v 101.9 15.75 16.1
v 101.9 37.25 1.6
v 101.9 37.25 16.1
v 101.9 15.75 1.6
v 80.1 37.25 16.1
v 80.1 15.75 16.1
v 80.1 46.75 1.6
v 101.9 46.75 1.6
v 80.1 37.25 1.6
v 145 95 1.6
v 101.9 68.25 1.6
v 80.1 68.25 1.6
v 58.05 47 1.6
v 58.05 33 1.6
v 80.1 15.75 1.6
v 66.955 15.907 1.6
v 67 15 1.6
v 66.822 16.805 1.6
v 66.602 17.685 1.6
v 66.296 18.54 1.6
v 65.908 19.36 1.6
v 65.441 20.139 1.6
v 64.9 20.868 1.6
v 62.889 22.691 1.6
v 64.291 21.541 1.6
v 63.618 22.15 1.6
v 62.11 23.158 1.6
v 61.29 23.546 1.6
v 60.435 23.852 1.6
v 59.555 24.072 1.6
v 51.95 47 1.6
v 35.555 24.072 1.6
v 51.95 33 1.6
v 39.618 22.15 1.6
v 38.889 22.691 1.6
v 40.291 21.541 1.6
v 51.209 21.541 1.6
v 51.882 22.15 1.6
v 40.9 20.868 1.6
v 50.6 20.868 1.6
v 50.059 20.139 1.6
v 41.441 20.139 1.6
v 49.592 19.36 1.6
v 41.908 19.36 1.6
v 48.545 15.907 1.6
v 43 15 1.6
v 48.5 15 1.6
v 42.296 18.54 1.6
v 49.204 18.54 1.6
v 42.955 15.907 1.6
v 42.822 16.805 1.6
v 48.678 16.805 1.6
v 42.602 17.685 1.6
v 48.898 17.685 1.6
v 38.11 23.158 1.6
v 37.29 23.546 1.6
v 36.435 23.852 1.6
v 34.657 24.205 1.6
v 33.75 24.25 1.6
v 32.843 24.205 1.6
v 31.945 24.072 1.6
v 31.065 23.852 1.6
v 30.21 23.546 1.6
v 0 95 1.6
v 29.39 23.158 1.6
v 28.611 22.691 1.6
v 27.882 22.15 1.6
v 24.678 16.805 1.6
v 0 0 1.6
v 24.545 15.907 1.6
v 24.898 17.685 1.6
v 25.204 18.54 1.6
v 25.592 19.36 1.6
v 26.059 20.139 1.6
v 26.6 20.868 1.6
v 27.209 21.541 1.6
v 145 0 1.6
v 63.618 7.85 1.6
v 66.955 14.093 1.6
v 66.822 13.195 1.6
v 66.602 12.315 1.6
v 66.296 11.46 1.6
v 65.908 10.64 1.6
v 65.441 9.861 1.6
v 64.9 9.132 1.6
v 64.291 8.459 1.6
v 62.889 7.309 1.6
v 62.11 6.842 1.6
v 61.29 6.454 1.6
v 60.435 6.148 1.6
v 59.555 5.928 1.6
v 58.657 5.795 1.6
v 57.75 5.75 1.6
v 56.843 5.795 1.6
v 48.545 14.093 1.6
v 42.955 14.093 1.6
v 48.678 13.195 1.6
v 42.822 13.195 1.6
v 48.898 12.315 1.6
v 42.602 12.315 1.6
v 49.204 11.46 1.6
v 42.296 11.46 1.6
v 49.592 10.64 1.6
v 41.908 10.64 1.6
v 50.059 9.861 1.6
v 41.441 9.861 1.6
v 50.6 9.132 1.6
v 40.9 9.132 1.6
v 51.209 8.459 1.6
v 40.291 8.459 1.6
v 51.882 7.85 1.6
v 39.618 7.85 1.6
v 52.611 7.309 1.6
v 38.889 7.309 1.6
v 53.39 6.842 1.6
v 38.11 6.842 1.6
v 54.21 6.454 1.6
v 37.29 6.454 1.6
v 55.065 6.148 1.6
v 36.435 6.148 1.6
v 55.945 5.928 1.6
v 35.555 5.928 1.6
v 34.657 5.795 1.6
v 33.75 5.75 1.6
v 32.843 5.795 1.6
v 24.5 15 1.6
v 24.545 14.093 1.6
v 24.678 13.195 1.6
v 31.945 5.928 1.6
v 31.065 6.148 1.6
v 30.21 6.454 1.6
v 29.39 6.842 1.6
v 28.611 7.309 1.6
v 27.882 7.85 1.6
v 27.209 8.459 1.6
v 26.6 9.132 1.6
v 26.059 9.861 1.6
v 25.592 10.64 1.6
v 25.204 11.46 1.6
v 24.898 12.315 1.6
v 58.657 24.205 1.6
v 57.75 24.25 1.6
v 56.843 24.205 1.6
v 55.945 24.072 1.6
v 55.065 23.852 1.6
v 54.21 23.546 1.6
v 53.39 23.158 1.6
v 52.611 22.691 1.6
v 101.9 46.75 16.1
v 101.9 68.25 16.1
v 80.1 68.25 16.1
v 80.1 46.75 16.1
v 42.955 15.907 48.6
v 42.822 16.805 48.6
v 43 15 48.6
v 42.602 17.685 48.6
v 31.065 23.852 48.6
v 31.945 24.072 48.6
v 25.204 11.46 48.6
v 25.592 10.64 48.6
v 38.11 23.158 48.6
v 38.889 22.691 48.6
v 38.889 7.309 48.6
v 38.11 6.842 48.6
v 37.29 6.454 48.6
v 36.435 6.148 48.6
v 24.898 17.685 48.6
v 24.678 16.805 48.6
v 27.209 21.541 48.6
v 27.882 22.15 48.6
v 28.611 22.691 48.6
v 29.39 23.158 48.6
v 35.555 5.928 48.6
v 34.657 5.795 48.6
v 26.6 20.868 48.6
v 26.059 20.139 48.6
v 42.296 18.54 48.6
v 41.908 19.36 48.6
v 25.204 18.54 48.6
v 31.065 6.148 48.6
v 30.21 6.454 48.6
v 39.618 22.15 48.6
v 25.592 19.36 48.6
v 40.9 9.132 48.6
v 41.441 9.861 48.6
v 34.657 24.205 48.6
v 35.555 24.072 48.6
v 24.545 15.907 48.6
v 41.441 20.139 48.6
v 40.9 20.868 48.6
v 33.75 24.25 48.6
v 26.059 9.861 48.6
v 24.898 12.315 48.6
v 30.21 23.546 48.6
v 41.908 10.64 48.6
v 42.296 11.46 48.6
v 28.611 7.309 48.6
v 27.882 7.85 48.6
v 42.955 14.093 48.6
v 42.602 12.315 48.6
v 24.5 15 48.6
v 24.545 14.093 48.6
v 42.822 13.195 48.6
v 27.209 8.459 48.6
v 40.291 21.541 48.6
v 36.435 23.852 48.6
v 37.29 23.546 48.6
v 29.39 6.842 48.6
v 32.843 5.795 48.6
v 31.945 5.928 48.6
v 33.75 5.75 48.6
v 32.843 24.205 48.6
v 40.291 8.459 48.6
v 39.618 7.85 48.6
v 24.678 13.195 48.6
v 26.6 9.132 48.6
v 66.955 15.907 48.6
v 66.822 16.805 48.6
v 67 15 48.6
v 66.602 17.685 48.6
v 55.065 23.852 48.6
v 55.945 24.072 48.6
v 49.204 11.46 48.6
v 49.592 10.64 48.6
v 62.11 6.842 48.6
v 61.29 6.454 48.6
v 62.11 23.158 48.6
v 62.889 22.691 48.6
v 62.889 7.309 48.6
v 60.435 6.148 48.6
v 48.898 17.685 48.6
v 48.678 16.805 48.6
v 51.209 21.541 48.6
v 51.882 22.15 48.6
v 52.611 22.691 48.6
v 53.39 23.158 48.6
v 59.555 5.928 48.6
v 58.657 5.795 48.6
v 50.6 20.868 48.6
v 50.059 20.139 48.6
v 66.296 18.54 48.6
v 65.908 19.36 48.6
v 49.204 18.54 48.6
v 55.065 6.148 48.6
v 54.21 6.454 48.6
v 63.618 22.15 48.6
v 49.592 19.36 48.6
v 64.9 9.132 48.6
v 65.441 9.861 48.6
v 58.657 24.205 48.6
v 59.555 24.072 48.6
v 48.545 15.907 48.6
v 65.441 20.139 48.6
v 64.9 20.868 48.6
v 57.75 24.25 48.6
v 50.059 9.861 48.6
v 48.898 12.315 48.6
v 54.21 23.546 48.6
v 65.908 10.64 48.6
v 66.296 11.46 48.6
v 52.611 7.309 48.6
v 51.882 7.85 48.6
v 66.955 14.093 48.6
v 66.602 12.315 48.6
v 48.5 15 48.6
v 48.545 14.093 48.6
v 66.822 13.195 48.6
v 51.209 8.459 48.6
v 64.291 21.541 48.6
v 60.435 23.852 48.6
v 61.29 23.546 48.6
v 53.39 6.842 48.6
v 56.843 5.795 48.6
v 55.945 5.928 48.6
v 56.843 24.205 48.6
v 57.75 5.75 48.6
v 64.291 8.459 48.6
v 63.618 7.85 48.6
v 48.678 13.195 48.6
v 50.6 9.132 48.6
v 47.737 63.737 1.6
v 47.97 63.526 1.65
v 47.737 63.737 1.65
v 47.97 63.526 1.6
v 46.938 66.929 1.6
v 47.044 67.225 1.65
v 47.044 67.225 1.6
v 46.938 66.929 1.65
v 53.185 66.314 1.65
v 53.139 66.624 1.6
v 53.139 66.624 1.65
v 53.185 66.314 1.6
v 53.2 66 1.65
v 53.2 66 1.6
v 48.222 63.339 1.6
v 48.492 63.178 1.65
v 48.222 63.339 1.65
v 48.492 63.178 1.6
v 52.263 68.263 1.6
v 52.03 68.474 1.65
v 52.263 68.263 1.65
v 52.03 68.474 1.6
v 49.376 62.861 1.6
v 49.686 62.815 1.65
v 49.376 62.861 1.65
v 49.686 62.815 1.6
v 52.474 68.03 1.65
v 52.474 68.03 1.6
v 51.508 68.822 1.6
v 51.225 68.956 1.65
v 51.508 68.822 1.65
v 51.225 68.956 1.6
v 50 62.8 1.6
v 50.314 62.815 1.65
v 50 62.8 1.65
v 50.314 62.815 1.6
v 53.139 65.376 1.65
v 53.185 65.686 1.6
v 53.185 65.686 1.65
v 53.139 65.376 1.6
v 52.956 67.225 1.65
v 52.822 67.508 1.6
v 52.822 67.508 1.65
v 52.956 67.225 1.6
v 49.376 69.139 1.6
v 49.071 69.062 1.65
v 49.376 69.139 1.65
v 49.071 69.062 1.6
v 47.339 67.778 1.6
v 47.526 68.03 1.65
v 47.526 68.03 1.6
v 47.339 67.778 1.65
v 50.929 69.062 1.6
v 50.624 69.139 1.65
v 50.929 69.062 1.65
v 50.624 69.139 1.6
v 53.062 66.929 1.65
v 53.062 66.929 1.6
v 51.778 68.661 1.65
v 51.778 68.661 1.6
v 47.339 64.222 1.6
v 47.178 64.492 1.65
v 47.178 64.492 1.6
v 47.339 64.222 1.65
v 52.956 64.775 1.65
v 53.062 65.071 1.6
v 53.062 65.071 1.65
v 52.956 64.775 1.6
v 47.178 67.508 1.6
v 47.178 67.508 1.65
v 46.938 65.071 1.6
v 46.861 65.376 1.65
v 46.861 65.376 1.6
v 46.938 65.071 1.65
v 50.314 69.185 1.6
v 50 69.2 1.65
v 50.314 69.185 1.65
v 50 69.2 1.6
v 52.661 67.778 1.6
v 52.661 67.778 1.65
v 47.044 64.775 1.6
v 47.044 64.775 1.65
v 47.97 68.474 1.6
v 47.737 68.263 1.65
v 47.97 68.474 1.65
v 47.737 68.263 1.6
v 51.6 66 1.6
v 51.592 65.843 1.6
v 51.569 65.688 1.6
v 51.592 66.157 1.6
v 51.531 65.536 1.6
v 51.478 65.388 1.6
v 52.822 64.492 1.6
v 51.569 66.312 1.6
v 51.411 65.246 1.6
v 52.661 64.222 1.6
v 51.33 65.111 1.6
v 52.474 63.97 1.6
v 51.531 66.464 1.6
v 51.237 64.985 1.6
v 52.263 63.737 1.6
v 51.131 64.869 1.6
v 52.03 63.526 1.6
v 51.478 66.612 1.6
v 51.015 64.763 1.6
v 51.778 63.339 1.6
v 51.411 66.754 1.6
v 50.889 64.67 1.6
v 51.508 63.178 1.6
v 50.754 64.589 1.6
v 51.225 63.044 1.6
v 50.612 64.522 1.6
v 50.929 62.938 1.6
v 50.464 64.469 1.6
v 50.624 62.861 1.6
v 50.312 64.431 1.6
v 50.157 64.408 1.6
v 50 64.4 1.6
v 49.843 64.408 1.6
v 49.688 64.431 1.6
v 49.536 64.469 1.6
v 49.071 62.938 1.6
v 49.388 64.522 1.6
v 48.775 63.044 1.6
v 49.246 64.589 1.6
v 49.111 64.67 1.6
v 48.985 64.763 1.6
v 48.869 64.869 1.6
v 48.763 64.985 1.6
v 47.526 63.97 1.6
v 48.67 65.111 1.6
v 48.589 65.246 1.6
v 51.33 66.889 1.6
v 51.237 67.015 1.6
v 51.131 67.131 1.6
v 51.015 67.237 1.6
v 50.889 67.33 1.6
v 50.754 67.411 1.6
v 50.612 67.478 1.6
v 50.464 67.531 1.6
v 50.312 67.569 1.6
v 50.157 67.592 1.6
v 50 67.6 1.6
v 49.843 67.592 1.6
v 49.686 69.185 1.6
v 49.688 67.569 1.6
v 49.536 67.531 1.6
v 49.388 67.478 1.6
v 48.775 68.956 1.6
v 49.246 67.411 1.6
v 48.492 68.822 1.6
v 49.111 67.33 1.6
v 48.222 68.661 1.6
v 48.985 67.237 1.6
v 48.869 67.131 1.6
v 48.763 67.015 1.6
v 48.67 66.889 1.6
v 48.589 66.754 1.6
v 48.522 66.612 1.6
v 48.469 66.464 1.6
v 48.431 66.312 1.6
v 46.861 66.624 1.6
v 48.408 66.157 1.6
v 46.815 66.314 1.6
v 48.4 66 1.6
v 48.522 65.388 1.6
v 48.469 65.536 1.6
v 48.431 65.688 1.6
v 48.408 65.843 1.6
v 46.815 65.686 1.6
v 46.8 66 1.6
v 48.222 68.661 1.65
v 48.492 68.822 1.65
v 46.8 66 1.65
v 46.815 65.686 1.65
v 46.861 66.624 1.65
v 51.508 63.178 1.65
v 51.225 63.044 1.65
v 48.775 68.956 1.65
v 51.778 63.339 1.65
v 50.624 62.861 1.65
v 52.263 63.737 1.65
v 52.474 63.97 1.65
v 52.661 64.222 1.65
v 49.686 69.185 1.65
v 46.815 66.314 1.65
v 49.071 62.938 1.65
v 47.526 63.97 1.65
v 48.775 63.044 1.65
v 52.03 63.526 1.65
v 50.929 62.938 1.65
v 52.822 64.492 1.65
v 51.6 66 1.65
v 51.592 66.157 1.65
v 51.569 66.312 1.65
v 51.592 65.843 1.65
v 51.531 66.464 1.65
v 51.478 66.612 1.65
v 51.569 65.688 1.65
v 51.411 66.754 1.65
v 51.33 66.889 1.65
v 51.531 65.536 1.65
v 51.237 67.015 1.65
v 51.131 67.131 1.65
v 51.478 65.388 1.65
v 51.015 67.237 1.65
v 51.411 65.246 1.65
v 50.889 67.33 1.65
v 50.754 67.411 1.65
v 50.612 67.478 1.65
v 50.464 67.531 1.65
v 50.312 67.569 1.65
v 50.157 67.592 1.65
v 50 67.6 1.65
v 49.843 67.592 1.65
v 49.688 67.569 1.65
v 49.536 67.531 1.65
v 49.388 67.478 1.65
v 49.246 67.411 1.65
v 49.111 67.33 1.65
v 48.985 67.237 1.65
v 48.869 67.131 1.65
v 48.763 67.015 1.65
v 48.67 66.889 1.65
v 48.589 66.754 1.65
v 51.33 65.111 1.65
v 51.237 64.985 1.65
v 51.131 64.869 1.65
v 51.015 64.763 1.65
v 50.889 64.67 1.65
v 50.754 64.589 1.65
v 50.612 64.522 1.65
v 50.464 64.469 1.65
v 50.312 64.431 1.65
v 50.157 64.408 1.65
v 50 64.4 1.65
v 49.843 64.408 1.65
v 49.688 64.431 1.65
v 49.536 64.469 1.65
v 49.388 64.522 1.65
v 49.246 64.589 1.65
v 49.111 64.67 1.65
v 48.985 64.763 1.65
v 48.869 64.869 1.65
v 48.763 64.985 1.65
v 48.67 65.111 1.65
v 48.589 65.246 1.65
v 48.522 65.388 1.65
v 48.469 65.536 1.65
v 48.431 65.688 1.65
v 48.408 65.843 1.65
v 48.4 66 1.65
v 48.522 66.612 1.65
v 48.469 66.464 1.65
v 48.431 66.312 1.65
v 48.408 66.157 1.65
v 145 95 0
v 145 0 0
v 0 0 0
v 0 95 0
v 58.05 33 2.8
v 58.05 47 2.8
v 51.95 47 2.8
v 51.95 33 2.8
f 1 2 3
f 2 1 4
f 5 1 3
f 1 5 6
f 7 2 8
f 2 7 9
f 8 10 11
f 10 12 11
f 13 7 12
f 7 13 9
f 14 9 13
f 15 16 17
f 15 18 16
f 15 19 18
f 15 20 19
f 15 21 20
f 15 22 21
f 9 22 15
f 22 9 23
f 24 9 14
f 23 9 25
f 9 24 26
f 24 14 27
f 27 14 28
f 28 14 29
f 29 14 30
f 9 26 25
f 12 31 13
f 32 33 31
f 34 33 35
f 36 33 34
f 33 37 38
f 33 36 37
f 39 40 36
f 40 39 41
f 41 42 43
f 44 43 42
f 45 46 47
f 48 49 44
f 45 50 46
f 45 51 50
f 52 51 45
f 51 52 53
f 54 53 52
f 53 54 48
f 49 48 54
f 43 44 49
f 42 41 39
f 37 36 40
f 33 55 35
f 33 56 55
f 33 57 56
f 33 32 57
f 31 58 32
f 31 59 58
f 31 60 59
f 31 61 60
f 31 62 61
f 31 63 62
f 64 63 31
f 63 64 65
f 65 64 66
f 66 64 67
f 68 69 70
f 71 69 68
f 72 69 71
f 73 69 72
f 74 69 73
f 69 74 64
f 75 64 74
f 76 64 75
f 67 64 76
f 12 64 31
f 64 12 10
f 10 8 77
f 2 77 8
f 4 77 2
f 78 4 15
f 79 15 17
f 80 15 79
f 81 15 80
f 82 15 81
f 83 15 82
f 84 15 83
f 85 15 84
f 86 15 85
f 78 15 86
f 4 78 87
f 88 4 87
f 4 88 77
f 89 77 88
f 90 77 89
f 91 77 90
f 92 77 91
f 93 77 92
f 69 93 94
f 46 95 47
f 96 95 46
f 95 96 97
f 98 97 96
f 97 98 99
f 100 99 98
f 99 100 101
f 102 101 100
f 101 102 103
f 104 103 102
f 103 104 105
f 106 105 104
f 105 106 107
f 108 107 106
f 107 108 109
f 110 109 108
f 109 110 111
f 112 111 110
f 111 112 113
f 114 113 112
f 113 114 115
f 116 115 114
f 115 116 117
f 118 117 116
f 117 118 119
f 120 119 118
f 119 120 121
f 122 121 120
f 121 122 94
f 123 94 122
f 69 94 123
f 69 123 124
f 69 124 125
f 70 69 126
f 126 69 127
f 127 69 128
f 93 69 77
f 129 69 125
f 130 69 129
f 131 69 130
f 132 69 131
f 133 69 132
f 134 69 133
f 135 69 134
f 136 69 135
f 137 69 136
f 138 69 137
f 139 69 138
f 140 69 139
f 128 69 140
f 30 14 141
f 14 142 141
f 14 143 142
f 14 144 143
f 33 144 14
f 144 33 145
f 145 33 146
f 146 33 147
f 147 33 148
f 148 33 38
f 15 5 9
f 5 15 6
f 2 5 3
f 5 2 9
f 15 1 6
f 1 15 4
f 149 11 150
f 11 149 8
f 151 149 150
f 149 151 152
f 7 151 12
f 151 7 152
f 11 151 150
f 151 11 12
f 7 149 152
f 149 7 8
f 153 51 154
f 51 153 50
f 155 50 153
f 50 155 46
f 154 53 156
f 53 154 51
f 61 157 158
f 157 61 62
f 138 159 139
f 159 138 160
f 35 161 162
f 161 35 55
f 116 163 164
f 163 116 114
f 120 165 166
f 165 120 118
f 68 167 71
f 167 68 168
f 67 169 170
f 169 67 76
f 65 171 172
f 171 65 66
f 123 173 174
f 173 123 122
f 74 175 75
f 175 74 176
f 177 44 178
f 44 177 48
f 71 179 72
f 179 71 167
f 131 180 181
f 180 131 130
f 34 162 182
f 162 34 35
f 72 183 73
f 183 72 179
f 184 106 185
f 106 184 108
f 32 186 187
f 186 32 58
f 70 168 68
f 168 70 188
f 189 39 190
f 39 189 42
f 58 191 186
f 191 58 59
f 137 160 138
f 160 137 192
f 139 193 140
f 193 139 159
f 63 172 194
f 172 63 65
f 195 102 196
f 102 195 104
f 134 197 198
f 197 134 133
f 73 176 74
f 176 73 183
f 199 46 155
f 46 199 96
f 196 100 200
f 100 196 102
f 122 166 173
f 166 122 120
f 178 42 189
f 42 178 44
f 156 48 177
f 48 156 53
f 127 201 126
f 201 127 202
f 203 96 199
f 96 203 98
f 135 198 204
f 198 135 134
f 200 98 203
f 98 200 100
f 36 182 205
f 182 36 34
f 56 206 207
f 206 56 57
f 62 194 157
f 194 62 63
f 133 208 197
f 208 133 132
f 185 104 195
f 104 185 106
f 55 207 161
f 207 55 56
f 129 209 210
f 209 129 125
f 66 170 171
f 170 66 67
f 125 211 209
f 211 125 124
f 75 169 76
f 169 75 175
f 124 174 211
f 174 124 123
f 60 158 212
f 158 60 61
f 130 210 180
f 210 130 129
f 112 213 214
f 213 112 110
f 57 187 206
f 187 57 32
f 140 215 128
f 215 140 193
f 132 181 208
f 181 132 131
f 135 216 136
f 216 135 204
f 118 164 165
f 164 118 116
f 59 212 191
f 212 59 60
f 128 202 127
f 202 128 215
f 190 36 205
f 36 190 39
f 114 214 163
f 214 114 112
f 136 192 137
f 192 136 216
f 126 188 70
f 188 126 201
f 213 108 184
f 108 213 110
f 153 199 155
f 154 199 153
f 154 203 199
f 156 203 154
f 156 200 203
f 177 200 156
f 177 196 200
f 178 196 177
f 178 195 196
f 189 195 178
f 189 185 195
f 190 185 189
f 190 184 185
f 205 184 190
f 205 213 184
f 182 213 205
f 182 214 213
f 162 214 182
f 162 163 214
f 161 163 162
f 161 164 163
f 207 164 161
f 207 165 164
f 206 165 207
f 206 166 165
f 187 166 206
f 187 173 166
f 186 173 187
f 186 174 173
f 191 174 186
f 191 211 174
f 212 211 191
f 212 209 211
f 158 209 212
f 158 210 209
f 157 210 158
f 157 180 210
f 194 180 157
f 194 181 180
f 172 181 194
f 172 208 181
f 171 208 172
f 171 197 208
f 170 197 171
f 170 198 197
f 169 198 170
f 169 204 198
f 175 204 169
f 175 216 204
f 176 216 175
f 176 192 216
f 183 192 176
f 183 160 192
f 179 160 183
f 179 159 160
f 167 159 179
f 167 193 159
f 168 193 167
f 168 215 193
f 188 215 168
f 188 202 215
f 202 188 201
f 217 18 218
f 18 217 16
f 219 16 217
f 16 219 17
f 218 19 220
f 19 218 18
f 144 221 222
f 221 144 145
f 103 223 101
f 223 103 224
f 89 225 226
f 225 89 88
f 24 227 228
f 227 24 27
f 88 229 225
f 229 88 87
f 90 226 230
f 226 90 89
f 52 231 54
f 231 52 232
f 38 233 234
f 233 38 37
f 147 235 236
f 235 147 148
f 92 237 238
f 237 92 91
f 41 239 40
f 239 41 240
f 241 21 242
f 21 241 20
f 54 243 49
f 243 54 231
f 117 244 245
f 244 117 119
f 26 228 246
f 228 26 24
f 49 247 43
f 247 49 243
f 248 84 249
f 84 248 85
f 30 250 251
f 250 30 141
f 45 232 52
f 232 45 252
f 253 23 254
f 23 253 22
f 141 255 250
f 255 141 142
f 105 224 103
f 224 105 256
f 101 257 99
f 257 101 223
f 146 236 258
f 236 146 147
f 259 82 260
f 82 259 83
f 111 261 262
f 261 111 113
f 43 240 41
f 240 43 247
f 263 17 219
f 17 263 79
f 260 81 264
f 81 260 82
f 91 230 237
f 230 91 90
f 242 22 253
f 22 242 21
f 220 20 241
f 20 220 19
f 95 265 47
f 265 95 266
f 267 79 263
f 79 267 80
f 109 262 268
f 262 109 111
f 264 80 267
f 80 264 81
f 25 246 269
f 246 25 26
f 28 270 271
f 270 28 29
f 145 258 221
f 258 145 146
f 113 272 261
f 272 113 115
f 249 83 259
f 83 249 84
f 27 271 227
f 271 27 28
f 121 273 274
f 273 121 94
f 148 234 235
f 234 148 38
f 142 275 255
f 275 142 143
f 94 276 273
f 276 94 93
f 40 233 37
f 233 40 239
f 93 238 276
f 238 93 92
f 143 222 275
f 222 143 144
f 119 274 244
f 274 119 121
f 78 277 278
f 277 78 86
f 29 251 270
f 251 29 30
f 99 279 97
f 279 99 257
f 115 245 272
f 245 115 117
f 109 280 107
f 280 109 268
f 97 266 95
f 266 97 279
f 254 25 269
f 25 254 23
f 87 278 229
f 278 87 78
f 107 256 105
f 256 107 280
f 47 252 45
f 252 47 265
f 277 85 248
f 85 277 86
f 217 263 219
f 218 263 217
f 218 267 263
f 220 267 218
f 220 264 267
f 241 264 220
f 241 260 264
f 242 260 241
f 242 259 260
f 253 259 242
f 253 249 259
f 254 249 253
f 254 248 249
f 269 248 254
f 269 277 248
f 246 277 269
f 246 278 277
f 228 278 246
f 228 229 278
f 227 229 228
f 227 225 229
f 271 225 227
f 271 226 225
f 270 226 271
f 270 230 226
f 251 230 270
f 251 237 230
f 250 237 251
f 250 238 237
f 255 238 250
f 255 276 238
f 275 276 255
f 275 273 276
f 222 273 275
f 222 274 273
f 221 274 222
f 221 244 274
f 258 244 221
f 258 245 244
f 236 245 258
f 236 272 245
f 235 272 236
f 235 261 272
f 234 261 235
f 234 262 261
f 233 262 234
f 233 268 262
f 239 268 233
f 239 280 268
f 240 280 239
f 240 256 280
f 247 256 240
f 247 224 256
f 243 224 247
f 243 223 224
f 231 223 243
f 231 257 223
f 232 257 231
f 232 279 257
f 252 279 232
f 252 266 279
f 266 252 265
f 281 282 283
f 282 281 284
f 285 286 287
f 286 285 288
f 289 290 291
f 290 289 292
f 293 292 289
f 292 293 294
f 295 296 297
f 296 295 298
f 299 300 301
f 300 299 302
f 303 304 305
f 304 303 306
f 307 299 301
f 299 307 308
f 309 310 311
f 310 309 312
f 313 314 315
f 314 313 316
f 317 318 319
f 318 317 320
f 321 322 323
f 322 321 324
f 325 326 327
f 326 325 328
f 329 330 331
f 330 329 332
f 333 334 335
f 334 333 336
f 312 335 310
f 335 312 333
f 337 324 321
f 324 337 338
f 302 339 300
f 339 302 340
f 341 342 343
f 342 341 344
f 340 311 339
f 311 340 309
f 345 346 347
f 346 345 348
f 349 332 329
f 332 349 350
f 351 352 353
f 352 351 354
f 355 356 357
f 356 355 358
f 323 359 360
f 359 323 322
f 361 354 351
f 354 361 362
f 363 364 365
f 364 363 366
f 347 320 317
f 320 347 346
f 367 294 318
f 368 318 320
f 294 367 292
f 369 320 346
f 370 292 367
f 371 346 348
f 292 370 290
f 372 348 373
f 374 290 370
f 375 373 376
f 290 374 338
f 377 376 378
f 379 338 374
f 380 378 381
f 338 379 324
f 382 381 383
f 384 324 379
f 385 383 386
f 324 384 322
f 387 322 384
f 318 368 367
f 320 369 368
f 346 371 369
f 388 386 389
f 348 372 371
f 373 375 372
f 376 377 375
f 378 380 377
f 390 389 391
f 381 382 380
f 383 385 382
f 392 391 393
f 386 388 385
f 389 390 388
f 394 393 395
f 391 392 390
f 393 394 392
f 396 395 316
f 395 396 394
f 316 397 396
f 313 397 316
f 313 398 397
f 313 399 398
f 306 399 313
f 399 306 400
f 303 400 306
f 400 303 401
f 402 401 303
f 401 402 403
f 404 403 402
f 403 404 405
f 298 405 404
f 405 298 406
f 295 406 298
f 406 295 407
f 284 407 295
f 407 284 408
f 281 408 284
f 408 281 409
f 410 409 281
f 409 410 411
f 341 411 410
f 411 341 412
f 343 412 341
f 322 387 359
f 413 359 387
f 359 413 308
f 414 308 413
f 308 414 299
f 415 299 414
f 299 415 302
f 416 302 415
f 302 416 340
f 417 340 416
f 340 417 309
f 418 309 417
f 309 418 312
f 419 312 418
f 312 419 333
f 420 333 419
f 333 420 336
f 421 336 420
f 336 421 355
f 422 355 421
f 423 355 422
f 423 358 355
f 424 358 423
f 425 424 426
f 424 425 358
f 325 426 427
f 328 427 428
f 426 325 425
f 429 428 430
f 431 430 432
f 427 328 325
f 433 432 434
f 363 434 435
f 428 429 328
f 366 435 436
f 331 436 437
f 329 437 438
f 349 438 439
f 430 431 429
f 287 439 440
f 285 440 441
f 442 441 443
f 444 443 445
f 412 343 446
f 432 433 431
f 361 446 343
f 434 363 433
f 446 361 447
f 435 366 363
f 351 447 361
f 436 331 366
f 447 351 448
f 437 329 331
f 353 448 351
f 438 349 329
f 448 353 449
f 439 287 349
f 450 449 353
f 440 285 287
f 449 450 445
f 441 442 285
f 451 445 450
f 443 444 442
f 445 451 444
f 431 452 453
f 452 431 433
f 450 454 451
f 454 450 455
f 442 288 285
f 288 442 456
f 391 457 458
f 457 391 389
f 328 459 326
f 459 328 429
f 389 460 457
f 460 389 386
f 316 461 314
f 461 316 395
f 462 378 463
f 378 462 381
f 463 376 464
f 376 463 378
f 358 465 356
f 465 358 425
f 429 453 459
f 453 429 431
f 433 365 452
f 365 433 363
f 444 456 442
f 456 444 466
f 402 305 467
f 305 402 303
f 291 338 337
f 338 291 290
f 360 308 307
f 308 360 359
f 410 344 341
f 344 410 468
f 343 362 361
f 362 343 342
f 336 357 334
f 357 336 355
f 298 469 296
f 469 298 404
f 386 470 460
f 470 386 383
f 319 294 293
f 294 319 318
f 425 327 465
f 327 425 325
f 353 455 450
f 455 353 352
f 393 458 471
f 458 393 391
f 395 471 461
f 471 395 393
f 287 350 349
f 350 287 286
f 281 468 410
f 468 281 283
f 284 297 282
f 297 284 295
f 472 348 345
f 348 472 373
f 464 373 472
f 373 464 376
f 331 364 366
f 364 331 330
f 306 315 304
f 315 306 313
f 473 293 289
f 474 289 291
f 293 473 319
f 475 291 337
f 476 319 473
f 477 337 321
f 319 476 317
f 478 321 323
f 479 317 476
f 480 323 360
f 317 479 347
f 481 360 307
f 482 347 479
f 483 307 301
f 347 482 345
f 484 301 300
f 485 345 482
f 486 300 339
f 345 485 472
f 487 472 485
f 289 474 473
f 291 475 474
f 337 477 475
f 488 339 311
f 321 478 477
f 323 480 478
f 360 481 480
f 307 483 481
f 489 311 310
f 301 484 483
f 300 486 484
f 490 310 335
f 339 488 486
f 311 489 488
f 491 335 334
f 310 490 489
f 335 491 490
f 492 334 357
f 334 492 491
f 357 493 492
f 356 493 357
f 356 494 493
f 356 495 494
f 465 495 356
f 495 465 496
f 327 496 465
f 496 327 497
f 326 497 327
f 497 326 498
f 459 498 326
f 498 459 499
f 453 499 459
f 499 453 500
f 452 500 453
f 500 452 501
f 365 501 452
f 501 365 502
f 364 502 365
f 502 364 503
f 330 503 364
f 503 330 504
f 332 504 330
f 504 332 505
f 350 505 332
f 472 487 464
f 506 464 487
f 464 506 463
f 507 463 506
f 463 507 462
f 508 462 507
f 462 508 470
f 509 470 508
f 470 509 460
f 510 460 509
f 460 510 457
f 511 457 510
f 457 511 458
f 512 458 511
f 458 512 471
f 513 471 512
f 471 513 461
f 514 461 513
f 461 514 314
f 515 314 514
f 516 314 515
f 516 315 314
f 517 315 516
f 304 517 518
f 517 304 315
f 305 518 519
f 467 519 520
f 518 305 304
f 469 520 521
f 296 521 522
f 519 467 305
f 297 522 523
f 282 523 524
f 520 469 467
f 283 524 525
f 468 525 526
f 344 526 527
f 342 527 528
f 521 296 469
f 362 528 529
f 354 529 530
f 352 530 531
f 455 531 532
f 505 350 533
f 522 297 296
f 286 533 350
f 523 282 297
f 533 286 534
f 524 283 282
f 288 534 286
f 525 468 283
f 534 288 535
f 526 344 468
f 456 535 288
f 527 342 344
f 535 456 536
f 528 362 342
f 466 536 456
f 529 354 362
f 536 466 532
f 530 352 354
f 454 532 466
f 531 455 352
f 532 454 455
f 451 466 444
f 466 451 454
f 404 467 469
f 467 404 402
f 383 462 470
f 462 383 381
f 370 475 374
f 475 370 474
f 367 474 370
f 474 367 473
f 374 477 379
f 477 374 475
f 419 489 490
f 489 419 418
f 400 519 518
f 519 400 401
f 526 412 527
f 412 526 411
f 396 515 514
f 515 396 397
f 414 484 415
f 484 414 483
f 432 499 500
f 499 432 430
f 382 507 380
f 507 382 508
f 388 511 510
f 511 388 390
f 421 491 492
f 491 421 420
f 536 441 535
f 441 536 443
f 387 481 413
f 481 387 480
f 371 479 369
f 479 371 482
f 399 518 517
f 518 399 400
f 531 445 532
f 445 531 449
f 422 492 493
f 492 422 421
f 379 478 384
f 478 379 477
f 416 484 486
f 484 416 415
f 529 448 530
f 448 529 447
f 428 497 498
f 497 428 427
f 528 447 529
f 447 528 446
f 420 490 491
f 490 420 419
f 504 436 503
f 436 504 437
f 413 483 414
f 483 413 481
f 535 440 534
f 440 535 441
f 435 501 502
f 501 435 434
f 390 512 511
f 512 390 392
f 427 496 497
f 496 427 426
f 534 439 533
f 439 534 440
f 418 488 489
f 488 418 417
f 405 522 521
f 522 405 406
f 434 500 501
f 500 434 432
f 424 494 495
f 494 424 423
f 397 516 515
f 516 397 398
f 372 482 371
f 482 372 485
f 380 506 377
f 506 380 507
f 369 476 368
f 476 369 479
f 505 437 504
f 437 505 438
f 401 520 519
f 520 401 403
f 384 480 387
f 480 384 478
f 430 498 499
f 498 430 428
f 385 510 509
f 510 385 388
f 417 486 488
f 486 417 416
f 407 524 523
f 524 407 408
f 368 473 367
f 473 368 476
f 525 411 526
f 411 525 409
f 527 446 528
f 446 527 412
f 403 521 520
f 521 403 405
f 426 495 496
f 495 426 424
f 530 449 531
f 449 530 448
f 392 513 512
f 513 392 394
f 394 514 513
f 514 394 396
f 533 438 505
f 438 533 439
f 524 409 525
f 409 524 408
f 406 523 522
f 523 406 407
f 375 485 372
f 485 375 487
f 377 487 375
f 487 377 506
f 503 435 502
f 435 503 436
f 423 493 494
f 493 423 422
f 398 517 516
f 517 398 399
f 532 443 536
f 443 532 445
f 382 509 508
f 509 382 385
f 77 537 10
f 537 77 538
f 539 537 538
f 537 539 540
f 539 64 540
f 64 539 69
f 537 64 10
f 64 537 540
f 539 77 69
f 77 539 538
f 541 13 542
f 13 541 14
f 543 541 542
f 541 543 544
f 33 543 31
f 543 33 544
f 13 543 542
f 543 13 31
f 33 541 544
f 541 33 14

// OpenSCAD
// Envelope de estudo, NÃO CAD fabril nem modelo dimensionado do gabinete PS28.
// D-014: mounting points/dissipação OEM são fixos; este retângulo NÃO é o contorno original.
// Master mecânico: original-board-reference.md e manual p.15-18.
// Cotas do fabricante e posições do core B; ver ps28-original-integration.json.
// Não representa furos do plate, woofer, T1, tolerâncias de montagem ou força de clamp.
show_adapter_example = false;
export_for_manufacture = false;
original_plate_measured = false;
assert(!export_for_manufacture || original_plate_measured,
       "BLOQUEADO: faltam plate, furos, contato do dissipador e profundidade medidos");
$fn = 64;
pcb_t = 1.6; // hipótese, stackup não aprovado
module body(center_xy, size_xyz, tone) {
    color(tone) translate([center_xy[0]-size_xyz[0]/2,
                           center_xy[1]-size_xyz[1]/2, pcb_t]) cube(size_xyz);
}
color("darkgreen") cube([145,95,pcb_t]);
body([55,40], [6.1,14,1.2], "black"); // DDV44, NÃO bottom-EP
for (xy=[[91,26.5],[91,57.5]])
    body(xy,[21.8,21.5,14.5],"dimgray"); // HCF2013 max, proxy sem geometria dos leads
for (x=[33.75,57.75]) {
    color("silver") translate([x,15,pcb_t]) cylinder(d=18.5,h=42);
    color([0,1,1,0.25]) translate([x,15,pcb_t+42]) cylinder(d=18.5,h=5);
}
// Ponto de ligação GND interno, não furo existente do gabinete.
color("gold") translate([50,66,pcb_t]) difference() {
    cylinder(d=6.4,h=0.05);cylinder(d=3.2,h=0.1);
}
if (show_adapter_example) {
    // Exemplo de orçamento térmico: direção/span finais dependem do dissipador real.
    color("peru") translate([55-3.8/2,40-6.6/2,pcb_t+1.2]) cube([3.8,6.6,4.8]);
    color([0.72,0.45,0.20,0.7]) translate([55-10,40-3.3,pcb_t+6]) cube([20,23.3,10]);
    echo("Adaptador ilustrativo: NÃO usar para usinagem ou furar plate original");
}
